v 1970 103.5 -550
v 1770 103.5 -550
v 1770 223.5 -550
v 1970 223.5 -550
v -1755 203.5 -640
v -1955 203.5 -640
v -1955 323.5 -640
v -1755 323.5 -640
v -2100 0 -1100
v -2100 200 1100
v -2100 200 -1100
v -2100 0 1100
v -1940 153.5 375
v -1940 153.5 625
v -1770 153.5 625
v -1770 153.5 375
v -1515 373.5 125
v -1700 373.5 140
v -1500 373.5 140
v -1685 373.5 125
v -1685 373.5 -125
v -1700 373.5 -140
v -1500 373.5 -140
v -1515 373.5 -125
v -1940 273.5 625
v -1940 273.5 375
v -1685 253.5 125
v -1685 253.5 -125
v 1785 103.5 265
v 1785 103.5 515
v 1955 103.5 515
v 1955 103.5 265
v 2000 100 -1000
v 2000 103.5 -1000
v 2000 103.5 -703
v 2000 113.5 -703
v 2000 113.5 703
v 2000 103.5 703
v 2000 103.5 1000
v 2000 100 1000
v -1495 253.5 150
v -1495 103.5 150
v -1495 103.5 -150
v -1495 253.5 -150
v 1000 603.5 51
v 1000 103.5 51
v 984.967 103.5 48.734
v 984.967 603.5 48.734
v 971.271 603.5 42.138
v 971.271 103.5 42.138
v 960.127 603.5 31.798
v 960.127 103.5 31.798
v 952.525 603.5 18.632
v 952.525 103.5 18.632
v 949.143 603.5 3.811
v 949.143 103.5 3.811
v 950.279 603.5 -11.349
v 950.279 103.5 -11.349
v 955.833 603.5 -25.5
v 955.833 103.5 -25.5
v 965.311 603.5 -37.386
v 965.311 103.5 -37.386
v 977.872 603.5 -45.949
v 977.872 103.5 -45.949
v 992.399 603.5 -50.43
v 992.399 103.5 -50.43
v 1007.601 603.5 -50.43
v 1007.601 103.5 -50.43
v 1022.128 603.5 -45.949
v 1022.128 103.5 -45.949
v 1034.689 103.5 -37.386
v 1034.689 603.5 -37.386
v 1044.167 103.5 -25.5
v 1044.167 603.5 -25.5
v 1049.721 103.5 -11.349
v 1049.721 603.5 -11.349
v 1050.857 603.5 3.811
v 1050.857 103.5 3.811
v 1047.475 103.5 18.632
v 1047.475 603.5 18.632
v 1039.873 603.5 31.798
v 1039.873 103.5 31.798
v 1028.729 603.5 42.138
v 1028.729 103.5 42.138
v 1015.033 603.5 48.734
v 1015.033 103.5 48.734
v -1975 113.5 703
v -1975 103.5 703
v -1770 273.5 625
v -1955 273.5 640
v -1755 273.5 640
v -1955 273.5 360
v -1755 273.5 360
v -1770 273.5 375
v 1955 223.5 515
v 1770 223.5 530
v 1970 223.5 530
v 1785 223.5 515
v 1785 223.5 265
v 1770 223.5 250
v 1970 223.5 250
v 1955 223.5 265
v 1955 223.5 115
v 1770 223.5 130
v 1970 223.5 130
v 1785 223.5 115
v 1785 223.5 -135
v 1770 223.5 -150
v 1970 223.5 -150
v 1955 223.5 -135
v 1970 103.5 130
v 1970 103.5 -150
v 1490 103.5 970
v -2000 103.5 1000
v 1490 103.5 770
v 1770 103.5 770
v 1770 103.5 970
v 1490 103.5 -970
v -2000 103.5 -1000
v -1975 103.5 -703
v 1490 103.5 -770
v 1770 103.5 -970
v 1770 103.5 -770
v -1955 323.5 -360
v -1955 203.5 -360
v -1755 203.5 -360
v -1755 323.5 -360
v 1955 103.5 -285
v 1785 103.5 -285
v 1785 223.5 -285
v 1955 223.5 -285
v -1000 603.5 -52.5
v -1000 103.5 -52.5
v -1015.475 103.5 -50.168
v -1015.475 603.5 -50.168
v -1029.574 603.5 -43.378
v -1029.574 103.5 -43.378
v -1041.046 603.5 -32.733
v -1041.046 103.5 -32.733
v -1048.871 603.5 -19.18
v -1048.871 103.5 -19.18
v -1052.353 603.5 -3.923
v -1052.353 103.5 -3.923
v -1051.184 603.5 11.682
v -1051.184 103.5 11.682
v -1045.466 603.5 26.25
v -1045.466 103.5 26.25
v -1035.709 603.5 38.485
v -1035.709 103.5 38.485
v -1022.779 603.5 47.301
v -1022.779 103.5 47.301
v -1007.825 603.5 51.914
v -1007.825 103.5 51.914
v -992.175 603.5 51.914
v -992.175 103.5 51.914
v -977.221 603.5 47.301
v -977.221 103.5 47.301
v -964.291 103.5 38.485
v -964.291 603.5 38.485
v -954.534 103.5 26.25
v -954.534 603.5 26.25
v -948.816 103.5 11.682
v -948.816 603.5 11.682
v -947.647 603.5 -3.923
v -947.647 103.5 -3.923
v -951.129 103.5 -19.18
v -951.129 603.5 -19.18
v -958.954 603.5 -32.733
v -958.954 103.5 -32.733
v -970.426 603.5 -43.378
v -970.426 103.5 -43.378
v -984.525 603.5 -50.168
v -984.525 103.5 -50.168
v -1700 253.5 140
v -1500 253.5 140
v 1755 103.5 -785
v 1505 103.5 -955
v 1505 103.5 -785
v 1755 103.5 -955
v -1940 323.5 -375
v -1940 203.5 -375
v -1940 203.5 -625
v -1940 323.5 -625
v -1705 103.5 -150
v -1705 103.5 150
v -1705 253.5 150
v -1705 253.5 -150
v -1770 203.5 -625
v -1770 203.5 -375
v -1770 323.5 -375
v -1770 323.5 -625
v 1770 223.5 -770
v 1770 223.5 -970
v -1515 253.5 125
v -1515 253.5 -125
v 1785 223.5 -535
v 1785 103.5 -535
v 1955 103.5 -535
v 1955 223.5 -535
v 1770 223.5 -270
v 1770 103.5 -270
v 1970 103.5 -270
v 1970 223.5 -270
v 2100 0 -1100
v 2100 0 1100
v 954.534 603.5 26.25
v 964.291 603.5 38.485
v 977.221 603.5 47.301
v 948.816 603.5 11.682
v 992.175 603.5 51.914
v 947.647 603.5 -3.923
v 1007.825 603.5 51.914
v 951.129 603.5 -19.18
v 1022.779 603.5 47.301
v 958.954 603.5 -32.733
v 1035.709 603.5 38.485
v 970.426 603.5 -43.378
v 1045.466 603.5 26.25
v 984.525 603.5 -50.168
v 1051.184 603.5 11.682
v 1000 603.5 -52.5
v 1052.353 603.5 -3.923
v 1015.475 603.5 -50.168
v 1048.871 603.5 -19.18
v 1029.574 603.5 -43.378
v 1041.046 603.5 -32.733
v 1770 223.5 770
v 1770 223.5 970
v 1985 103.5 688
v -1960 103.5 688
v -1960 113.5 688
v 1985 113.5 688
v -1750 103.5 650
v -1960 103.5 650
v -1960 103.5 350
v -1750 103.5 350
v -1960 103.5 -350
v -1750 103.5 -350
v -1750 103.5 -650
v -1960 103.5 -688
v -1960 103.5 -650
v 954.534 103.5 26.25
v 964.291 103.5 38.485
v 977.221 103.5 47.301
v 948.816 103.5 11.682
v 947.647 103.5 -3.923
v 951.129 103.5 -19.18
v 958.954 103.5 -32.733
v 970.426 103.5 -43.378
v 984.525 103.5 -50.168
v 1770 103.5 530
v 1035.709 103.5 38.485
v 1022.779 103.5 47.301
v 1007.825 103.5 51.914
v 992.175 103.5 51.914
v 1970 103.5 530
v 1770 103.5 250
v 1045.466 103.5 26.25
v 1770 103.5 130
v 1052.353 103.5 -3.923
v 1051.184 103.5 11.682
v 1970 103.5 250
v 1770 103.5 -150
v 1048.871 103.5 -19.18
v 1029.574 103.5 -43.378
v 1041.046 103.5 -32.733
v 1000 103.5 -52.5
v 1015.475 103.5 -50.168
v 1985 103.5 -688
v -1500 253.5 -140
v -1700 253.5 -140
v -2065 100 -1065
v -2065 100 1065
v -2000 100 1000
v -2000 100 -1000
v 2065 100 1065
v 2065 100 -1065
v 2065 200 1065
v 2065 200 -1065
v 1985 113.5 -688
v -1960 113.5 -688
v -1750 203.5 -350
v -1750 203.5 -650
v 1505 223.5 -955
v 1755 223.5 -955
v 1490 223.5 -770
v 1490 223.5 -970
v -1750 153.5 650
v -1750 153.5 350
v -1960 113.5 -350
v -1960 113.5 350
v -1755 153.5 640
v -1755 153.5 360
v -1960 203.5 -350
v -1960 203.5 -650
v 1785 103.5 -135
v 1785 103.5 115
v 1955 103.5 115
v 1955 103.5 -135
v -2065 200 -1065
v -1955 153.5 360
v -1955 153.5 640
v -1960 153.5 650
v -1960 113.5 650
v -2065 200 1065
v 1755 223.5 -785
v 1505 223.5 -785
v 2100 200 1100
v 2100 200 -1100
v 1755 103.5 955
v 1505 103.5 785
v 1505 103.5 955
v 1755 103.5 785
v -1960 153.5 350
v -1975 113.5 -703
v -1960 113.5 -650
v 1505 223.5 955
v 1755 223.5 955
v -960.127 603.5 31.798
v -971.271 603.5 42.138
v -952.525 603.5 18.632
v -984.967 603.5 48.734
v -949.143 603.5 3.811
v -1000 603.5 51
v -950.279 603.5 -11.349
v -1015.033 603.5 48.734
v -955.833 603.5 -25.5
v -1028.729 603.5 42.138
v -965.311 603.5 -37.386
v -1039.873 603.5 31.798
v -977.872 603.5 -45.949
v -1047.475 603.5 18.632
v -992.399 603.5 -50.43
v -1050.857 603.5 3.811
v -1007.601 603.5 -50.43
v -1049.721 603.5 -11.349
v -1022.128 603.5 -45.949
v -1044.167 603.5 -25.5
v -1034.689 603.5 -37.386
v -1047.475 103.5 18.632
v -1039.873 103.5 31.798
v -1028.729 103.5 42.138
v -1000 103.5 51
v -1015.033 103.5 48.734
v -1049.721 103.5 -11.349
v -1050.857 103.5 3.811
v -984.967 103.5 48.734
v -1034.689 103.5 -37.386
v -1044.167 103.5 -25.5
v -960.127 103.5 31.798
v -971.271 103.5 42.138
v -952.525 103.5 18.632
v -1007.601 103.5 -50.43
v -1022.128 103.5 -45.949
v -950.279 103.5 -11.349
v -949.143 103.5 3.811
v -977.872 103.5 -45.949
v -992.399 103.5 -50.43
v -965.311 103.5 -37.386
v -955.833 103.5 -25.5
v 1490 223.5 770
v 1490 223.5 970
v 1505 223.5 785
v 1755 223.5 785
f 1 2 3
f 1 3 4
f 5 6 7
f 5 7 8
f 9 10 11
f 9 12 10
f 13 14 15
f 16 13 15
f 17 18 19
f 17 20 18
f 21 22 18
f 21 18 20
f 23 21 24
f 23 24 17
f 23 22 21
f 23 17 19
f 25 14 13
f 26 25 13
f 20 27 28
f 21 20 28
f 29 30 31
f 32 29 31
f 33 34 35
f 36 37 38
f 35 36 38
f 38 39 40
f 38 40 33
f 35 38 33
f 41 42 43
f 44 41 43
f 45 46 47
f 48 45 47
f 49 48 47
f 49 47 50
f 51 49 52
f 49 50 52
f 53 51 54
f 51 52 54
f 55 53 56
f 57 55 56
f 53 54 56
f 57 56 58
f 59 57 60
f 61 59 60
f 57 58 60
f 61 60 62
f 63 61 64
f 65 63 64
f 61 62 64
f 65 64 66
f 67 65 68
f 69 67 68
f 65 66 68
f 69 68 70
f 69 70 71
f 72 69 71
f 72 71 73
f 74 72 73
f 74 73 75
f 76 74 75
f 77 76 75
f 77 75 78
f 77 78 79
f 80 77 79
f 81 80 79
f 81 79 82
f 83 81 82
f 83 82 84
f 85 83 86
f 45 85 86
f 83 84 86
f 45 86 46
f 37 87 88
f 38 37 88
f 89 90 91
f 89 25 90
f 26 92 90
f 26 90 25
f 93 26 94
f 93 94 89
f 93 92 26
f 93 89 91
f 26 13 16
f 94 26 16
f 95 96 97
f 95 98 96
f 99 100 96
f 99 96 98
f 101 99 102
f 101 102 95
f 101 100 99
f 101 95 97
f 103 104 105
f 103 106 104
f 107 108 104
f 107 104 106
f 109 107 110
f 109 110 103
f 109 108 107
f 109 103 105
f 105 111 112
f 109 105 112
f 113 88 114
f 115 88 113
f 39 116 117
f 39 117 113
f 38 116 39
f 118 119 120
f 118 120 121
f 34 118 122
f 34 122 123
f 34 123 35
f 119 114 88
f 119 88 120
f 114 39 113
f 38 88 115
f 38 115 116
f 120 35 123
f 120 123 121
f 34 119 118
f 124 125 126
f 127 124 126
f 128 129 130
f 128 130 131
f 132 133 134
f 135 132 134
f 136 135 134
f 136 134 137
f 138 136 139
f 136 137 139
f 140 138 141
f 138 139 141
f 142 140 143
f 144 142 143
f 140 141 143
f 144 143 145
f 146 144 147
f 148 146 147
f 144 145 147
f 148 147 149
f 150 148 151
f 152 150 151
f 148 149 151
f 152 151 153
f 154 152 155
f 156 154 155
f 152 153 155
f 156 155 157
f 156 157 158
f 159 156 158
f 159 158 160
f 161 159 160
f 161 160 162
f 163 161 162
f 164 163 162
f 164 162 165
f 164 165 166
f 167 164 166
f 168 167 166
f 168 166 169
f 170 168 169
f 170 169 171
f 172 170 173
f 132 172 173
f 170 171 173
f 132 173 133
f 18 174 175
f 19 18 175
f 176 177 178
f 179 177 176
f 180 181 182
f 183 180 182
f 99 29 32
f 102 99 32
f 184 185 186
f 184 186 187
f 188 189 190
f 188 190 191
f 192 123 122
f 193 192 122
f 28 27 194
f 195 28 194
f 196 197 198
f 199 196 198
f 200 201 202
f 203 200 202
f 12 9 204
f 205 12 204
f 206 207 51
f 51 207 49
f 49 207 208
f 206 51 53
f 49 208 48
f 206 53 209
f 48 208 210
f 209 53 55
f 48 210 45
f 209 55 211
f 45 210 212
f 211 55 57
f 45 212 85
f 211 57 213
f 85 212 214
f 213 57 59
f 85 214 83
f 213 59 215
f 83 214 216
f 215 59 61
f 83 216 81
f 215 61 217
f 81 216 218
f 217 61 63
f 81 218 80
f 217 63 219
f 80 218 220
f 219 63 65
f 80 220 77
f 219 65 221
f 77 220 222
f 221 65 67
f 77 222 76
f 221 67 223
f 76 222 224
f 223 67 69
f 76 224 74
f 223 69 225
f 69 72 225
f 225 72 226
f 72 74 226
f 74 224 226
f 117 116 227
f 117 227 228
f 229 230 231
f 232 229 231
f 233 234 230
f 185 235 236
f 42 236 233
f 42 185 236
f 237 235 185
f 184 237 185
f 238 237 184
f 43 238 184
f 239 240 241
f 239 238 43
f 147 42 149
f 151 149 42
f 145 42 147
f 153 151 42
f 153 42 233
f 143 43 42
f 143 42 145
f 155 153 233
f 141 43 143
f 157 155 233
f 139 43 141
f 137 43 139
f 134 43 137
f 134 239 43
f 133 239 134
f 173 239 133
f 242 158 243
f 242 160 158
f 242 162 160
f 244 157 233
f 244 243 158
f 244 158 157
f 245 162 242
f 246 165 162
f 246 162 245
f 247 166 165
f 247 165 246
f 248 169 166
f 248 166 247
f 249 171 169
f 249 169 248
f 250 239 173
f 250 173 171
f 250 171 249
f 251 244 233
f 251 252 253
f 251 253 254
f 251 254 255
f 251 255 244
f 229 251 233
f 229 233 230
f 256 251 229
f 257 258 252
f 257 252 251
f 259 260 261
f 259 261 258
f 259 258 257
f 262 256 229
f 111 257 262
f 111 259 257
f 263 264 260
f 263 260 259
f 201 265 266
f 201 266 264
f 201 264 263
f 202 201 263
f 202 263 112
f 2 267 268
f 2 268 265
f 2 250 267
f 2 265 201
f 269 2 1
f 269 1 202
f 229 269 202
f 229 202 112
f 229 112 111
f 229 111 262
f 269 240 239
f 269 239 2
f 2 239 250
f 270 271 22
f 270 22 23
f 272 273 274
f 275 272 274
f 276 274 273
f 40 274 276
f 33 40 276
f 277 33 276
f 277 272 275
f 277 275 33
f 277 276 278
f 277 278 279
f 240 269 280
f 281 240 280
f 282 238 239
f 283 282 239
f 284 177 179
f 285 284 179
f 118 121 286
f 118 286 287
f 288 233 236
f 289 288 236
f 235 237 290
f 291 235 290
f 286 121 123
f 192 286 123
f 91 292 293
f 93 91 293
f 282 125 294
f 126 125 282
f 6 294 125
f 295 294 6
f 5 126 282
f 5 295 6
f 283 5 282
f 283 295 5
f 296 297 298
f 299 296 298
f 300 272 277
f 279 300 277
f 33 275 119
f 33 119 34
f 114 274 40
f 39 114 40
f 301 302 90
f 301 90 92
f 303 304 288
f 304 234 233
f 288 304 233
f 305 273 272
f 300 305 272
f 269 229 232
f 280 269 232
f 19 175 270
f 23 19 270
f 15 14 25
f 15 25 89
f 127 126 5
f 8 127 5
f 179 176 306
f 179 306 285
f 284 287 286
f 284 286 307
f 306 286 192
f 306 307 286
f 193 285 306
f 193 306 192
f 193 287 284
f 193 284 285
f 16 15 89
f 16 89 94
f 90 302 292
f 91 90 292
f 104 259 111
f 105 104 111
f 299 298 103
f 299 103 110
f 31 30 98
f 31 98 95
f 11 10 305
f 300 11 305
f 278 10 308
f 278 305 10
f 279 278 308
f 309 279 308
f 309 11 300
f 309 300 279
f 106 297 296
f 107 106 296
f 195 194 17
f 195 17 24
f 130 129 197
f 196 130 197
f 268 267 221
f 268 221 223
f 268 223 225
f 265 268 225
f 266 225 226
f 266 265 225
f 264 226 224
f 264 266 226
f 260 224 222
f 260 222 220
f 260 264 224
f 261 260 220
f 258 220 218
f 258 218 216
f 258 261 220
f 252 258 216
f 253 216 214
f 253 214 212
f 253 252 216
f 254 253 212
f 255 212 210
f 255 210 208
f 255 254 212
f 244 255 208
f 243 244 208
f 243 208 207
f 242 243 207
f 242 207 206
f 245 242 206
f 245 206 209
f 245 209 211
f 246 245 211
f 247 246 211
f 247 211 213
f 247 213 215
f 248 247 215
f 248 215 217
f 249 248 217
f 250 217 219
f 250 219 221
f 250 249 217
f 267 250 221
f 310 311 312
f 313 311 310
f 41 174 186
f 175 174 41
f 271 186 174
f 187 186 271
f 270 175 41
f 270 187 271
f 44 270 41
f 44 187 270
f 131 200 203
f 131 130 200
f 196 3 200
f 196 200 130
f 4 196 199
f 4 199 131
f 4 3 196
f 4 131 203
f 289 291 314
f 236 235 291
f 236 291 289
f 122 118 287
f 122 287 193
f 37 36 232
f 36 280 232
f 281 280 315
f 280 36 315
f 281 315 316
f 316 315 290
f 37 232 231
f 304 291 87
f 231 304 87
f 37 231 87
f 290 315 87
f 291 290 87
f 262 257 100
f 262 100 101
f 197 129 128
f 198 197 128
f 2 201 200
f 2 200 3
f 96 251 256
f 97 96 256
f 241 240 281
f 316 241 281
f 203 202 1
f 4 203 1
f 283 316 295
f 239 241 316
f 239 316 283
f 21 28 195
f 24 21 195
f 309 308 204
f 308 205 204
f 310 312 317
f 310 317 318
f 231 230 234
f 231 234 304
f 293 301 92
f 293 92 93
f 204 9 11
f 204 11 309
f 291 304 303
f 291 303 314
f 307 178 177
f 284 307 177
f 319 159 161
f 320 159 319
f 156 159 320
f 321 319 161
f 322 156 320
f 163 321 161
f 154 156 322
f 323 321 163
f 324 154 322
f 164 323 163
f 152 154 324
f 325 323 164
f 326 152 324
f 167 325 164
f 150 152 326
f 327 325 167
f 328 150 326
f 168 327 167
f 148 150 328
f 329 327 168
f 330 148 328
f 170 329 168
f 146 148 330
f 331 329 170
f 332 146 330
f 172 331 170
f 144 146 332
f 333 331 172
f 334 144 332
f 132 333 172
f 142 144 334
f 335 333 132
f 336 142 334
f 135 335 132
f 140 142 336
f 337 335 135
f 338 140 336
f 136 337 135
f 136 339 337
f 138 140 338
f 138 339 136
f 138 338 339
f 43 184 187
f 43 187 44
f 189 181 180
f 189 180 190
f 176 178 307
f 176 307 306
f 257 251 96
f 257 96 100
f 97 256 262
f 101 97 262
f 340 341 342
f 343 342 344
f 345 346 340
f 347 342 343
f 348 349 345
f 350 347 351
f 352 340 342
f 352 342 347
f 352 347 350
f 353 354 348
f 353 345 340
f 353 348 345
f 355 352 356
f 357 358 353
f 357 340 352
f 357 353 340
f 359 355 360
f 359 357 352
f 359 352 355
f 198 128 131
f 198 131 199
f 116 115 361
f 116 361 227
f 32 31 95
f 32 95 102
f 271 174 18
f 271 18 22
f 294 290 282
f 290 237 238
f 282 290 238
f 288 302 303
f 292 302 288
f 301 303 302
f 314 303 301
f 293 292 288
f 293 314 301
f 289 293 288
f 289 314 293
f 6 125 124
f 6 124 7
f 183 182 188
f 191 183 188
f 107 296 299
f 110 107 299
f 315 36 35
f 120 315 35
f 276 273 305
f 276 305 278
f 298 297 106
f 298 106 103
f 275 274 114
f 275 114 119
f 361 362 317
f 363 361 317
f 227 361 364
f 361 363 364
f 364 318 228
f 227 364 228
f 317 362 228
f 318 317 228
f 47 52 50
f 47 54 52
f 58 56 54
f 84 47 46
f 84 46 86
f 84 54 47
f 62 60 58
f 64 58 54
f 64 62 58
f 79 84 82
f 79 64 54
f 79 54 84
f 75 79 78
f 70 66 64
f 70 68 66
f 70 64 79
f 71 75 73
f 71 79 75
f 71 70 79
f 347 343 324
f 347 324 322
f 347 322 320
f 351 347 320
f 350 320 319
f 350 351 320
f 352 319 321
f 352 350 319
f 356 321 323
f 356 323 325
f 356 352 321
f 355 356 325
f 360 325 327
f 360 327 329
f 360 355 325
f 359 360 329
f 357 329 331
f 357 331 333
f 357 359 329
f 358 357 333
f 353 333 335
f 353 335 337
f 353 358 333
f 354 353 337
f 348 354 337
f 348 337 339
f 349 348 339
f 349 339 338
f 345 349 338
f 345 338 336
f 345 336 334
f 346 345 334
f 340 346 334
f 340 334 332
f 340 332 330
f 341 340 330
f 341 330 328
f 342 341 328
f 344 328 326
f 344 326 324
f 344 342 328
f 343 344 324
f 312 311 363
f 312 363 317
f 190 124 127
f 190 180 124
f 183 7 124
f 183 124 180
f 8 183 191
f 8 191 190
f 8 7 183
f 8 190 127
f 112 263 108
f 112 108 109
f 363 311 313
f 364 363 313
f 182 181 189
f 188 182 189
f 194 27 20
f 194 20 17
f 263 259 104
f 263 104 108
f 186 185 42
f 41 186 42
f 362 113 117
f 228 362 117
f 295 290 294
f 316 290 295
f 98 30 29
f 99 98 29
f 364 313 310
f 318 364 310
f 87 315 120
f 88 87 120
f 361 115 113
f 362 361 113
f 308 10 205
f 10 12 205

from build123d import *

# Parameters (mm, degrees)
SKETCH_1_W             = 4200
SKETCH_1_H             = 2200
EXTRUDE_1_DEPTH        = 100
SKETCH_2_W             = 4000
SKETCH_2_H             = 2000
EXTRUDE_2_DEPTH        = 3.5
SKETCH_3_W             = 4200
SKETCH_3_H             = 2200
SKETCH_3_W_2           = 4130
SKETCH_3_H_2           = 2130
EXTRUDE_4_DEPTH        = 100
SKETCH_4_W             = 210
SKETCH_4_H             = 300
EXTRUDE_5_DEPTH        = 100
SKETCH_4_4_W           = 210
SKETCH_4_4_H           = 300
EXTRUDE_6_DEPTH        = 150
SKETCH_4_5_W           = 210
SKETCH_4_5_H           = 300
EXTRUDE_7_DEPTH        = 50
SKETCH_7_R             = 52.5
SKETCH_7_R_2           = 51
EXTRUDE_8_DEPTH        = 500
SKETCH_8_W             = 280
SKETCH_8_H             = 200
SKETCH_8_W_2           = 250
SKETCH_8_H_2           = 170
EXTRUDE_9_DEPTH        = 120
SKETCH_9_W             = 200
SKETCH_9_H             = 280
SKETCH_9_W_2           = 170
SKETCH_9_H_2           = 250
EXTRUDE_10_DEPTH       = 120
PATTERN_LINEAR_1_COUNT = 3
PATTERN_LINEAR_1_PITCH = 400
SKETCH_10_W            = 200
SKETCH_10_H            = 280
SKETCH_10_W_2          = 170
SKETCH_10_H_2          = 250
EXTRUDE_11_DEPTH       = 120
SKETCH_11_W            = 200
SKETCH_11_H            = 280
SKETCH_11_W_2          = 170
SKETCH_11_H_2          = 250
EXTRUDE_12_DEPTH       = 120
SKETCH_12_W            = 200
SKETCH_12_H            = 280
SKETCH_12_W_2          = 170
SKETCH_12_H_2          = 250
EXTRUDE_13_DEPTH       = 120
SKETCH_24_W            = 15
SKETCH_24_H            = 10


with BuildPart() as part:
    # 草图1 → 凸台-拉伸1 (new body)
    with BuildSketch(Plane(origin=(0, 0, 0), x_dir=(1, 0, 0), z_dir=(0, 1, 0))):
        Rectangle(SKETCH_1_W, SKETCH_1_H)
    extrude(amount=EXTRUDE_1_DEPTH)

    # 草图2 → 凸台-拉伸2 (add)
    with BuildSketch(Plane(origin=(0, 100, 0), x_dir=(1, 0, 0), z_dir=(0, 1, 0))):
        Rectangle(SKETCH_2_W, SKETCH_2_H)
    extrude(amount=EXTRUDE_2_DEPTH)

    # 草图3 → 凸台-拉伸4 (add)
    with BuildSketch(Plane(origin=(0, 100, 0), x_dir=(1, 0, 0), z_dir=(0, 1, 0))):
        Rectangle(SKETCH_3_W, SKETCH_3_H)
        Rectangle(SKETCH_3_W_2, SKETCH_3_H_2, mode=Mode.SUBTRACT)
    extrude(amount=EXTRUDE_4_DEPTH)

    # 草图4 → 凸台-拉伸5 (add)
    with BuildSketch(Plane(origin=(0, 103.5, 0), x_dir=(1, 0, 0), z_dir=(0, 1, 0))):
        with Locations((-1855, 500)):
            Rectangle(SKETCH_4_W, SKETCH_4_H)
    extrude(amount=EXTRUDE_5_DEPTH)

    # 草图4<4> → 凸台-拉伸6 (add)
    with BuildSketch(Plane(origin=(0, 103.5, 0), x_dir=(1, 0, 0), z_dir=(0, 1, 0))):
        with Locations((-1600, 0)):
            Rectangle(SKETCH_4_4_W, SKETCH_4_4_H)
    extrude(amount=EXTRUDE_6_DEPTH)

    # 草图4<5> → 凸台-拉伸7 (add)
    with BuildSketch(Plane(origin=(0, 103.5, 0), x_dir=(1, 0, 0), z_dir=(0, 1, 0))):
        with Locations((-1855, -500)):
            Rectangle(SKETCH_4_5_W, SKETCH_4_5_H)
    extrude(amount=EXTRUDE_7_DEPTH)

    # 草图7 → 凸台-拉伸8 (add)
    with BuildSketch(Plane(origin=(0, 103.5, 0), x_dir=(1, 0, 0), z_dir=(0, 1, 0))):
        with Locations((-1000, 0)):
            Circle(SKETCH_7_R)
        with Locations((-1000, 0)):
            Circle(SKETCH_7_R_2, mode=Mode.SUBTRACT)
    extrude_8 = extrude(amount=EXTRUDE_8_DEPTH)

    # 镜向2: 凸台-拉伸8 across plane
    add(extrude_8.mirror(Plane(origin=(0, 0, 0), x_dir=(0, 0, 1), z_dir=(1, 0, 0))))

    # 草图8 → 凸台-拉伸9 (add)
    with BuildSketch(Plane(origin=(0, 103.5, 0), x_dir=(1, 0, 0), z_dir=(0, 1, 0))):
        with Locations((1630, 870)):
            Rectangle(SKETCH_8_W, SKETCH_8_H)
        with Locations((1630, 870)):
            Rectangle(SKETCH_8_W_2, SKETCH_8_H_2, mode=Mode.SUBTRACT)
    extrude_9 = extrude(amount=EXTRUDE_9_DEPTH)

    # 草图9 → 凸台-拉伸10 (add)
    with BuildSketch(Plane(origin=(0, 103.5, 0), x_dir=(1, 0, 0), z_dir=(0, 1, 0))):
        with Locations((1870, 410)):
            Rectangle(SKETCH_9_W, SKETCH_9_H)
        with Locations((1870, 410)):
            Rectangle(SKETCH_9_W_2, SKETCH_9_H_2, mode=Mode.SUBTRACT)
    extrude_10 = extrude(amount=EXTRUDE_10_DEPTH)

    # 阵列(线性)1: 凸台-拉伸10 ×3
    with Locations(*[(0, 0, i * PATTERN_LINEAR_1_PITCH) for i in range(1, PATTERN_LINEAR_1_COUNT)]):
        add(extrude_10)

    # 镜向3: 凸台-拉伸9 across plane
    add(extrude_9.mirror(Plane.XY))

    # 草图10 → 凸台-拉伸11 (add)
    with BuildSketch(Plane(origin=(0, 203.5, 0), x_dir=(1, 0, 0), z_dir=(0, 1, 0))):
        with Locations((-1855, 500)):
            Rectangle(SKETCH_10_W, SKETCH_10_H)
        with Locations((-1855, 500)):
            Rectangle(SKETCH_10_W_2, SKETCH_10_H_2, mode=Mode.SUBTRACT)
    extrude(amount=EXTRUDE_11_DEPTH)

    # 草图11 → 凸台-拉伸12 (add)
    with BuildSketch(Plane(origin=(0, 253.5, 0), x_dir=(1, 0, 0), z_dir=(0, 1, 0))):
        with Locations((-1600, 0)):
            Rectangle(SKETCH_11_W, SKETCH_11_H)
        with Locations((-1600, 0)):
            Rectangle(SKETCH_11_W_2, SKETCH_11_H_2, mode=Mode.SUBTRACT)
    extrude(amount=EXTRUDE_12_DEPTH)

    # 草图12 → 凸台-拉伸13 (add)
    with BuildSketch(Plane(origin=(0, 153.5, 0), x_dir=(1, 0, 0), z_dir=(0, 1, 0))):
        with Locations((-1855, -500)):
            Rectangle(SKETCH_12_W, SKETCH_12_H)
        with Locations((-1855, -500)):
            Rectangle(SKETCH_12_W_2, SKETCH_12_H_2, mode=Mode.SUBTRACT)
    extrude(amount=EXTRUDE_13_DEPTH)

    # 扫描2: sweep along a path in 草图23
    with BuildLine(Plane(origin=(0, 103.5, 0), x_dir=(1, 0, 0), z_dir=(0, 1, 0))) as sweep_2_path:
        Line((2000, -703), (-1975, -703))
        Line((-1975, -703), (-1975, 703))
        Line((-1975, 703), (2000, 703))
        Line((2000, 703), (2000, -703))
    # 草图24 → 扫描2 (sweep)
    with BuildSketch(Plane.XY):
        with Locations((-1967.5, 108.5)):
            Rectangle(SKETCH_24_W, SKETCH_24_H)
    sweep(path=sweep_2_path.line, transition=Transition.RIGHT)


solid = part.part
